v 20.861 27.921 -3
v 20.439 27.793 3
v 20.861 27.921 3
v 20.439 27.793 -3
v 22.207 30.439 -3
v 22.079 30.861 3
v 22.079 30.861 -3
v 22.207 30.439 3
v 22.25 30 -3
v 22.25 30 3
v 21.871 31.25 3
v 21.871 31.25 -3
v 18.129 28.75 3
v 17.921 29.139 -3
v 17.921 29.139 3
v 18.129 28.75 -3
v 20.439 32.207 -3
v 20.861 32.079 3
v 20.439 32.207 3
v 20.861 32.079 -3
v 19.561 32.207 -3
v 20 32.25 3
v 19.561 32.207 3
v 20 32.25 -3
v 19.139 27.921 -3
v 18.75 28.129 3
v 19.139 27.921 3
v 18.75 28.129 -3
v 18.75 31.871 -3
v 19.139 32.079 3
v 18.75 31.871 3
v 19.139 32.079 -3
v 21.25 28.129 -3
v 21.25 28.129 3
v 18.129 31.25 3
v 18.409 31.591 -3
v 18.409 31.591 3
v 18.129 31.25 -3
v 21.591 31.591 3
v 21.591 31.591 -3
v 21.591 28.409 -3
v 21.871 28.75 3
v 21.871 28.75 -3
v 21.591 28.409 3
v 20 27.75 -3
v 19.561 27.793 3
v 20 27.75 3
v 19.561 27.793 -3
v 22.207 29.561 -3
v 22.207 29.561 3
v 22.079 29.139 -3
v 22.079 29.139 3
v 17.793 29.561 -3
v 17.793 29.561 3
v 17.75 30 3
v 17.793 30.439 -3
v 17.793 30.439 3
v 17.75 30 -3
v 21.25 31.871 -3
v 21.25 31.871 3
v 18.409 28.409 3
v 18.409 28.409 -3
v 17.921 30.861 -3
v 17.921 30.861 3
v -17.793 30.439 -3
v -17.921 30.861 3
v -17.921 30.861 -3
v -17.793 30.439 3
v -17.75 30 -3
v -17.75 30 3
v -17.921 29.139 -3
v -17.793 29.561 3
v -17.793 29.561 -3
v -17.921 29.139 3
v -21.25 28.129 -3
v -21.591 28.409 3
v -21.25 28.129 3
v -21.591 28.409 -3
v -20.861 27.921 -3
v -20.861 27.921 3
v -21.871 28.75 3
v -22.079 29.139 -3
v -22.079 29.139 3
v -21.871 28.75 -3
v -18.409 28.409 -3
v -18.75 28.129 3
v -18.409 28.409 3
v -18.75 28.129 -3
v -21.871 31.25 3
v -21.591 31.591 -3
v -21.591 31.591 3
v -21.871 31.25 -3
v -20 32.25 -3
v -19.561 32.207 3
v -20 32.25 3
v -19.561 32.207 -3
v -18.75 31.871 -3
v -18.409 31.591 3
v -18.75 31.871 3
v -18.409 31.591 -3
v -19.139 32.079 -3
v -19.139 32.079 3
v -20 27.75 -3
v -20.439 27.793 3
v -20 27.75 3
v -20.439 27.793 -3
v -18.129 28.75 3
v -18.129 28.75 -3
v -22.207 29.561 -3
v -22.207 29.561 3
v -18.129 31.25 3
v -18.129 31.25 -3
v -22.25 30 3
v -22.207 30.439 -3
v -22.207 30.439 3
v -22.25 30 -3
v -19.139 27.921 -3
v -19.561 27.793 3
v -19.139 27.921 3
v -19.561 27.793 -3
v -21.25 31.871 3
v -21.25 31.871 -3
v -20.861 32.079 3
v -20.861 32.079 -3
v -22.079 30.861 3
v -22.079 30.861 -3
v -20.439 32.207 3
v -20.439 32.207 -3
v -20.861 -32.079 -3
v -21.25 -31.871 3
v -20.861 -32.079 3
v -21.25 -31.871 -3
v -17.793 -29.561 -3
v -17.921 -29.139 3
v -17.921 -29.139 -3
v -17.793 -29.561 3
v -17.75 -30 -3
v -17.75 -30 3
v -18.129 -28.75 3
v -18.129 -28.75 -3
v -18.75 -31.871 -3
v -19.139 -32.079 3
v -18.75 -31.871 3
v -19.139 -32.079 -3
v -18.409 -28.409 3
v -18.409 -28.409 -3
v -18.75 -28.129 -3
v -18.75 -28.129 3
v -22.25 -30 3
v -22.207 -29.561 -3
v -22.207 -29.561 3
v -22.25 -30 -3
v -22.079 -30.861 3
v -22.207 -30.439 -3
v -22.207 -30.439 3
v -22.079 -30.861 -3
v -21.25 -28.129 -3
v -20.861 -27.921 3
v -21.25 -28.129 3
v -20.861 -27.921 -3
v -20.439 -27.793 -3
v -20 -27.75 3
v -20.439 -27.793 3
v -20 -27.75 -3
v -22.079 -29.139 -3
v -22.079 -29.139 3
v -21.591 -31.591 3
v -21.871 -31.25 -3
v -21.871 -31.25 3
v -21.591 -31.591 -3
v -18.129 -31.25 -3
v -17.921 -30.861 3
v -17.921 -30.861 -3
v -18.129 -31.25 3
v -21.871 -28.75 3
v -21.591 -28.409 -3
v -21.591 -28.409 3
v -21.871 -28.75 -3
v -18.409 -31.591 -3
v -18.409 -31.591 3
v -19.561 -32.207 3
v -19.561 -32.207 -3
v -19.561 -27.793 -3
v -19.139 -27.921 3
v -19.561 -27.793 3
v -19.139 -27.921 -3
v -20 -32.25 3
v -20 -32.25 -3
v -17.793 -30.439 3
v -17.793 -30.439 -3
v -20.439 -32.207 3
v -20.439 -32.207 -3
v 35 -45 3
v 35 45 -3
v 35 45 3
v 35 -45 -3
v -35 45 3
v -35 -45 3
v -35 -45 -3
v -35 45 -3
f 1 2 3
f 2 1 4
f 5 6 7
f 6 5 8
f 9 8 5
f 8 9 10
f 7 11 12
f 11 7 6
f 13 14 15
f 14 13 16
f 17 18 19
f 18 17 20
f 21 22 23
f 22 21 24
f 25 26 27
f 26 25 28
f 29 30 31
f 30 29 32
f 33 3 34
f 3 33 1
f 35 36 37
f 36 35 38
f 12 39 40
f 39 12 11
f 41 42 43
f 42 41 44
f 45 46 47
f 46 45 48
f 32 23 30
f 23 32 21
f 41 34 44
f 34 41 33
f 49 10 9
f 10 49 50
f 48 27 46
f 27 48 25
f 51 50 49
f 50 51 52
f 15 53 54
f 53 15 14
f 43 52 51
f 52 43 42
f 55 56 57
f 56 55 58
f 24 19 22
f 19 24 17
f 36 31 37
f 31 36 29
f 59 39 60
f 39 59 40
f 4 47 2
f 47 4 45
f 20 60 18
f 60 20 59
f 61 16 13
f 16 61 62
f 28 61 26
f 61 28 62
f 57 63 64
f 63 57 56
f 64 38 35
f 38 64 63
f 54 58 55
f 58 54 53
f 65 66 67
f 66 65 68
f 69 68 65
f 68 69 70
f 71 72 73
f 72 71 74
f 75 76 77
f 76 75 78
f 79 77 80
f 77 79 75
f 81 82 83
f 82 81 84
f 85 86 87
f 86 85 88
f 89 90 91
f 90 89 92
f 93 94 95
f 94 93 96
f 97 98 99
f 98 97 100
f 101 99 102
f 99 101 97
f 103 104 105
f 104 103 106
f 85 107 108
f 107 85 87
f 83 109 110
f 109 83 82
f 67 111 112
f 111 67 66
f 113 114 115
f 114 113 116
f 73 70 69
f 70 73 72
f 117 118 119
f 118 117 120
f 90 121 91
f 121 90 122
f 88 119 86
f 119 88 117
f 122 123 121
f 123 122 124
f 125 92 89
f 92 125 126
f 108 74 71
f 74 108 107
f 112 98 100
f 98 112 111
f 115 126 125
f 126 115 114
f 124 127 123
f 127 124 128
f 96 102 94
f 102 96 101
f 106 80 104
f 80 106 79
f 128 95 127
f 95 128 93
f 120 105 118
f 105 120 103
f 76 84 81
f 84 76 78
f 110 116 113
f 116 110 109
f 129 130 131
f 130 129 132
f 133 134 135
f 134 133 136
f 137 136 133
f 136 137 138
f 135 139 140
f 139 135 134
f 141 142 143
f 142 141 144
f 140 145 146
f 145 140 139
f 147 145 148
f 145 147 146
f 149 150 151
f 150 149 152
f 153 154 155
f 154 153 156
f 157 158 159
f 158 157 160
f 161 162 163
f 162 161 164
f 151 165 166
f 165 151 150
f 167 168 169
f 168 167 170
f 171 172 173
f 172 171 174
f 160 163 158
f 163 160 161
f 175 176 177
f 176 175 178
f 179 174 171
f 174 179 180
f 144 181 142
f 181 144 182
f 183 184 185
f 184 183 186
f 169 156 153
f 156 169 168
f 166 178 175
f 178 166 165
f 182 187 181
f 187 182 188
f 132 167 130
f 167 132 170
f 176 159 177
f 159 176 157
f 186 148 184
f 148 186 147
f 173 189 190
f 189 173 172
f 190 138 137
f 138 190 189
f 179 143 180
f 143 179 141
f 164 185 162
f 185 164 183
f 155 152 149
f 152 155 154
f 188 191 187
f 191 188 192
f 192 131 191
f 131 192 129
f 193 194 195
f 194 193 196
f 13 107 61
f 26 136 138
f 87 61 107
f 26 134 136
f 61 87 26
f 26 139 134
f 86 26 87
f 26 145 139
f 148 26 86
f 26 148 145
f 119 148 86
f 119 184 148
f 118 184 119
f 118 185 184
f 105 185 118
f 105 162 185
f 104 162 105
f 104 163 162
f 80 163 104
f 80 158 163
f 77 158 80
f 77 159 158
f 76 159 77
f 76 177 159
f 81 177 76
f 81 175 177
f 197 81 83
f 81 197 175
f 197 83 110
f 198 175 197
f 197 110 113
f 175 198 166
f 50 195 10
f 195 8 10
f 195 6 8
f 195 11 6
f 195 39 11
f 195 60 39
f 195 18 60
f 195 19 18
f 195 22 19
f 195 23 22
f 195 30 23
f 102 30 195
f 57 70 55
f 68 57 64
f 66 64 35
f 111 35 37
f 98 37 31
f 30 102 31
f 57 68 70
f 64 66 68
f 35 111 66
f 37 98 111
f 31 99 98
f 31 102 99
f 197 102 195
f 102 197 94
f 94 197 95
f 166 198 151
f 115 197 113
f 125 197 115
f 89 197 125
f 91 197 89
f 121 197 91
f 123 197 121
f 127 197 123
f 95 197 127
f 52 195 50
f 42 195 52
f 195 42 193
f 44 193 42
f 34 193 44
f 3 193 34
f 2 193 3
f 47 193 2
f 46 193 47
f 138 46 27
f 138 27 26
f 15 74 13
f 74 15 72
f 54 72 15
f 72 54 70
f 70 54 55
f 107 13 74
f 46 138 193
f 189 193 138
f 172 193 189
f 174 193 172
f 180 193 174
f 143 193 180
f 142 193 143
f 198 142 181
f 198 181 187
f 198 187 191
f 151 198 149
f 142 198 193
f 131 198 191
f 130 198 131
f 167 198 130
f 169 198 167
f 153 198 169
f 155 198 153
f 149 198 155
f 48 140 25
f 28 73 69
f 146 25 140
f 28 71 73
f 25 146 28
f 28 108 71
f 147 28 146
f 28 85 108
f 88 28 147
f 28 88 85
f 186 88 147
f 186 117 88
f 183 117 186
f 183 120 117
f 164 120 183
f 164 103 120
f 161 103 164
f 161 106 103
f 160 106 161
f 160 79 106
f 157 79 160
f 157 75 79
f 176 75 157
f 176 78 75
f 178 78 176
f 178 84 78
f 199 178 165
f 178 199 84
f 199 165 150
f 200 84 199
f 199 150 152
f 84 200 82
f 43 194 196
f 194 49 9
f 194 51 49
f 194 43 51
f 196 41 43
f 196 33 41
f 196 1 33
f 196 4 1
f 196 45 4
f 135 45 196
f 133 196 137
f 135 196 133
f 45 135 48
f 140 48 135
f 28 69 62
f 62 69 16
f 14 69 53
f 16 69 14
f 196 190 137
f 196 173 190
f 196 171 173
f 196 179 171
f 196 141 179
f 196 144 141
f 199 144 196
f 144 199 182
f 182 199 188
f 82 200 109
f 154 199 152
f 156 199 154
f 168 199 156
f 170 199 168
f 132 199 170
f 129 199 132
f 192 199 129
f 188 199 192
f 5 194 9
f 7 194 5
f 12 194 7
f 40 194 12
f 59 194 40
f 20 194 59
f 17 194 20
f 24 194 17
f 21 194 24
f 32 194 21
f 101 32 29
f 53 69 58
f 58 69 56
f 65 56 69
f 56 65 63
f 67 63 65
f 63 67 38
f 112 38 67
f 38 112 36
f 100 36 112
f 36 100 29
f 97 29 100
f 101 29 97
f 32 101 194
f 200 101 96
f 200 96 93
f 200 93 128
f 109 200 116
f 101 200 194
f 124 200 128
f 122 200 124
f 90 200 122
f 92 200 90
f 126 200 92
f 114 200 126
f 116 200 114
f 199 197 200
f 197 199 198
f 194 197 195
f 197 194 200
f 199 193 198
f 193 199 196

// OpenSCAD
$fn = 32;

// ----------------------------------------------------------------------
// Corner plate 70 x 90 x 6
// 3 holes, centres taken from the edge offset
// ----------------------------------------------------------------------

// --- parameters (mm) ---
plate = [70, 90, 6];  // overall size (x, y, z)
holes = 3;            // number of holes the drawing asks for
hole_d = 4.5;         // hole diameter
edge = 15;            // hole centre offset from the plate edge

// --- derived feature positions (mm) ---
corner_x = plate[0] / 2 - edge;  // = 20   corner hole X
corner_y = plate[1] / 2 - edge;  // = 30   corner hole Y
feature_centers = [
  [corner_x, corner_y],
  [-corner_x, corner_y],
  [-corner_x, -corner_y]
];   // hole centres the loop below drills

// plate outline, every hole drilled through with the same cutters
difference() {
  cube(plate, center = true);
  for (centre = feature_centers)
    translate([centre[0], centre[1], 0])
      cylinder(d = hole_d, h = plate[2] + 2, center = true);
}
